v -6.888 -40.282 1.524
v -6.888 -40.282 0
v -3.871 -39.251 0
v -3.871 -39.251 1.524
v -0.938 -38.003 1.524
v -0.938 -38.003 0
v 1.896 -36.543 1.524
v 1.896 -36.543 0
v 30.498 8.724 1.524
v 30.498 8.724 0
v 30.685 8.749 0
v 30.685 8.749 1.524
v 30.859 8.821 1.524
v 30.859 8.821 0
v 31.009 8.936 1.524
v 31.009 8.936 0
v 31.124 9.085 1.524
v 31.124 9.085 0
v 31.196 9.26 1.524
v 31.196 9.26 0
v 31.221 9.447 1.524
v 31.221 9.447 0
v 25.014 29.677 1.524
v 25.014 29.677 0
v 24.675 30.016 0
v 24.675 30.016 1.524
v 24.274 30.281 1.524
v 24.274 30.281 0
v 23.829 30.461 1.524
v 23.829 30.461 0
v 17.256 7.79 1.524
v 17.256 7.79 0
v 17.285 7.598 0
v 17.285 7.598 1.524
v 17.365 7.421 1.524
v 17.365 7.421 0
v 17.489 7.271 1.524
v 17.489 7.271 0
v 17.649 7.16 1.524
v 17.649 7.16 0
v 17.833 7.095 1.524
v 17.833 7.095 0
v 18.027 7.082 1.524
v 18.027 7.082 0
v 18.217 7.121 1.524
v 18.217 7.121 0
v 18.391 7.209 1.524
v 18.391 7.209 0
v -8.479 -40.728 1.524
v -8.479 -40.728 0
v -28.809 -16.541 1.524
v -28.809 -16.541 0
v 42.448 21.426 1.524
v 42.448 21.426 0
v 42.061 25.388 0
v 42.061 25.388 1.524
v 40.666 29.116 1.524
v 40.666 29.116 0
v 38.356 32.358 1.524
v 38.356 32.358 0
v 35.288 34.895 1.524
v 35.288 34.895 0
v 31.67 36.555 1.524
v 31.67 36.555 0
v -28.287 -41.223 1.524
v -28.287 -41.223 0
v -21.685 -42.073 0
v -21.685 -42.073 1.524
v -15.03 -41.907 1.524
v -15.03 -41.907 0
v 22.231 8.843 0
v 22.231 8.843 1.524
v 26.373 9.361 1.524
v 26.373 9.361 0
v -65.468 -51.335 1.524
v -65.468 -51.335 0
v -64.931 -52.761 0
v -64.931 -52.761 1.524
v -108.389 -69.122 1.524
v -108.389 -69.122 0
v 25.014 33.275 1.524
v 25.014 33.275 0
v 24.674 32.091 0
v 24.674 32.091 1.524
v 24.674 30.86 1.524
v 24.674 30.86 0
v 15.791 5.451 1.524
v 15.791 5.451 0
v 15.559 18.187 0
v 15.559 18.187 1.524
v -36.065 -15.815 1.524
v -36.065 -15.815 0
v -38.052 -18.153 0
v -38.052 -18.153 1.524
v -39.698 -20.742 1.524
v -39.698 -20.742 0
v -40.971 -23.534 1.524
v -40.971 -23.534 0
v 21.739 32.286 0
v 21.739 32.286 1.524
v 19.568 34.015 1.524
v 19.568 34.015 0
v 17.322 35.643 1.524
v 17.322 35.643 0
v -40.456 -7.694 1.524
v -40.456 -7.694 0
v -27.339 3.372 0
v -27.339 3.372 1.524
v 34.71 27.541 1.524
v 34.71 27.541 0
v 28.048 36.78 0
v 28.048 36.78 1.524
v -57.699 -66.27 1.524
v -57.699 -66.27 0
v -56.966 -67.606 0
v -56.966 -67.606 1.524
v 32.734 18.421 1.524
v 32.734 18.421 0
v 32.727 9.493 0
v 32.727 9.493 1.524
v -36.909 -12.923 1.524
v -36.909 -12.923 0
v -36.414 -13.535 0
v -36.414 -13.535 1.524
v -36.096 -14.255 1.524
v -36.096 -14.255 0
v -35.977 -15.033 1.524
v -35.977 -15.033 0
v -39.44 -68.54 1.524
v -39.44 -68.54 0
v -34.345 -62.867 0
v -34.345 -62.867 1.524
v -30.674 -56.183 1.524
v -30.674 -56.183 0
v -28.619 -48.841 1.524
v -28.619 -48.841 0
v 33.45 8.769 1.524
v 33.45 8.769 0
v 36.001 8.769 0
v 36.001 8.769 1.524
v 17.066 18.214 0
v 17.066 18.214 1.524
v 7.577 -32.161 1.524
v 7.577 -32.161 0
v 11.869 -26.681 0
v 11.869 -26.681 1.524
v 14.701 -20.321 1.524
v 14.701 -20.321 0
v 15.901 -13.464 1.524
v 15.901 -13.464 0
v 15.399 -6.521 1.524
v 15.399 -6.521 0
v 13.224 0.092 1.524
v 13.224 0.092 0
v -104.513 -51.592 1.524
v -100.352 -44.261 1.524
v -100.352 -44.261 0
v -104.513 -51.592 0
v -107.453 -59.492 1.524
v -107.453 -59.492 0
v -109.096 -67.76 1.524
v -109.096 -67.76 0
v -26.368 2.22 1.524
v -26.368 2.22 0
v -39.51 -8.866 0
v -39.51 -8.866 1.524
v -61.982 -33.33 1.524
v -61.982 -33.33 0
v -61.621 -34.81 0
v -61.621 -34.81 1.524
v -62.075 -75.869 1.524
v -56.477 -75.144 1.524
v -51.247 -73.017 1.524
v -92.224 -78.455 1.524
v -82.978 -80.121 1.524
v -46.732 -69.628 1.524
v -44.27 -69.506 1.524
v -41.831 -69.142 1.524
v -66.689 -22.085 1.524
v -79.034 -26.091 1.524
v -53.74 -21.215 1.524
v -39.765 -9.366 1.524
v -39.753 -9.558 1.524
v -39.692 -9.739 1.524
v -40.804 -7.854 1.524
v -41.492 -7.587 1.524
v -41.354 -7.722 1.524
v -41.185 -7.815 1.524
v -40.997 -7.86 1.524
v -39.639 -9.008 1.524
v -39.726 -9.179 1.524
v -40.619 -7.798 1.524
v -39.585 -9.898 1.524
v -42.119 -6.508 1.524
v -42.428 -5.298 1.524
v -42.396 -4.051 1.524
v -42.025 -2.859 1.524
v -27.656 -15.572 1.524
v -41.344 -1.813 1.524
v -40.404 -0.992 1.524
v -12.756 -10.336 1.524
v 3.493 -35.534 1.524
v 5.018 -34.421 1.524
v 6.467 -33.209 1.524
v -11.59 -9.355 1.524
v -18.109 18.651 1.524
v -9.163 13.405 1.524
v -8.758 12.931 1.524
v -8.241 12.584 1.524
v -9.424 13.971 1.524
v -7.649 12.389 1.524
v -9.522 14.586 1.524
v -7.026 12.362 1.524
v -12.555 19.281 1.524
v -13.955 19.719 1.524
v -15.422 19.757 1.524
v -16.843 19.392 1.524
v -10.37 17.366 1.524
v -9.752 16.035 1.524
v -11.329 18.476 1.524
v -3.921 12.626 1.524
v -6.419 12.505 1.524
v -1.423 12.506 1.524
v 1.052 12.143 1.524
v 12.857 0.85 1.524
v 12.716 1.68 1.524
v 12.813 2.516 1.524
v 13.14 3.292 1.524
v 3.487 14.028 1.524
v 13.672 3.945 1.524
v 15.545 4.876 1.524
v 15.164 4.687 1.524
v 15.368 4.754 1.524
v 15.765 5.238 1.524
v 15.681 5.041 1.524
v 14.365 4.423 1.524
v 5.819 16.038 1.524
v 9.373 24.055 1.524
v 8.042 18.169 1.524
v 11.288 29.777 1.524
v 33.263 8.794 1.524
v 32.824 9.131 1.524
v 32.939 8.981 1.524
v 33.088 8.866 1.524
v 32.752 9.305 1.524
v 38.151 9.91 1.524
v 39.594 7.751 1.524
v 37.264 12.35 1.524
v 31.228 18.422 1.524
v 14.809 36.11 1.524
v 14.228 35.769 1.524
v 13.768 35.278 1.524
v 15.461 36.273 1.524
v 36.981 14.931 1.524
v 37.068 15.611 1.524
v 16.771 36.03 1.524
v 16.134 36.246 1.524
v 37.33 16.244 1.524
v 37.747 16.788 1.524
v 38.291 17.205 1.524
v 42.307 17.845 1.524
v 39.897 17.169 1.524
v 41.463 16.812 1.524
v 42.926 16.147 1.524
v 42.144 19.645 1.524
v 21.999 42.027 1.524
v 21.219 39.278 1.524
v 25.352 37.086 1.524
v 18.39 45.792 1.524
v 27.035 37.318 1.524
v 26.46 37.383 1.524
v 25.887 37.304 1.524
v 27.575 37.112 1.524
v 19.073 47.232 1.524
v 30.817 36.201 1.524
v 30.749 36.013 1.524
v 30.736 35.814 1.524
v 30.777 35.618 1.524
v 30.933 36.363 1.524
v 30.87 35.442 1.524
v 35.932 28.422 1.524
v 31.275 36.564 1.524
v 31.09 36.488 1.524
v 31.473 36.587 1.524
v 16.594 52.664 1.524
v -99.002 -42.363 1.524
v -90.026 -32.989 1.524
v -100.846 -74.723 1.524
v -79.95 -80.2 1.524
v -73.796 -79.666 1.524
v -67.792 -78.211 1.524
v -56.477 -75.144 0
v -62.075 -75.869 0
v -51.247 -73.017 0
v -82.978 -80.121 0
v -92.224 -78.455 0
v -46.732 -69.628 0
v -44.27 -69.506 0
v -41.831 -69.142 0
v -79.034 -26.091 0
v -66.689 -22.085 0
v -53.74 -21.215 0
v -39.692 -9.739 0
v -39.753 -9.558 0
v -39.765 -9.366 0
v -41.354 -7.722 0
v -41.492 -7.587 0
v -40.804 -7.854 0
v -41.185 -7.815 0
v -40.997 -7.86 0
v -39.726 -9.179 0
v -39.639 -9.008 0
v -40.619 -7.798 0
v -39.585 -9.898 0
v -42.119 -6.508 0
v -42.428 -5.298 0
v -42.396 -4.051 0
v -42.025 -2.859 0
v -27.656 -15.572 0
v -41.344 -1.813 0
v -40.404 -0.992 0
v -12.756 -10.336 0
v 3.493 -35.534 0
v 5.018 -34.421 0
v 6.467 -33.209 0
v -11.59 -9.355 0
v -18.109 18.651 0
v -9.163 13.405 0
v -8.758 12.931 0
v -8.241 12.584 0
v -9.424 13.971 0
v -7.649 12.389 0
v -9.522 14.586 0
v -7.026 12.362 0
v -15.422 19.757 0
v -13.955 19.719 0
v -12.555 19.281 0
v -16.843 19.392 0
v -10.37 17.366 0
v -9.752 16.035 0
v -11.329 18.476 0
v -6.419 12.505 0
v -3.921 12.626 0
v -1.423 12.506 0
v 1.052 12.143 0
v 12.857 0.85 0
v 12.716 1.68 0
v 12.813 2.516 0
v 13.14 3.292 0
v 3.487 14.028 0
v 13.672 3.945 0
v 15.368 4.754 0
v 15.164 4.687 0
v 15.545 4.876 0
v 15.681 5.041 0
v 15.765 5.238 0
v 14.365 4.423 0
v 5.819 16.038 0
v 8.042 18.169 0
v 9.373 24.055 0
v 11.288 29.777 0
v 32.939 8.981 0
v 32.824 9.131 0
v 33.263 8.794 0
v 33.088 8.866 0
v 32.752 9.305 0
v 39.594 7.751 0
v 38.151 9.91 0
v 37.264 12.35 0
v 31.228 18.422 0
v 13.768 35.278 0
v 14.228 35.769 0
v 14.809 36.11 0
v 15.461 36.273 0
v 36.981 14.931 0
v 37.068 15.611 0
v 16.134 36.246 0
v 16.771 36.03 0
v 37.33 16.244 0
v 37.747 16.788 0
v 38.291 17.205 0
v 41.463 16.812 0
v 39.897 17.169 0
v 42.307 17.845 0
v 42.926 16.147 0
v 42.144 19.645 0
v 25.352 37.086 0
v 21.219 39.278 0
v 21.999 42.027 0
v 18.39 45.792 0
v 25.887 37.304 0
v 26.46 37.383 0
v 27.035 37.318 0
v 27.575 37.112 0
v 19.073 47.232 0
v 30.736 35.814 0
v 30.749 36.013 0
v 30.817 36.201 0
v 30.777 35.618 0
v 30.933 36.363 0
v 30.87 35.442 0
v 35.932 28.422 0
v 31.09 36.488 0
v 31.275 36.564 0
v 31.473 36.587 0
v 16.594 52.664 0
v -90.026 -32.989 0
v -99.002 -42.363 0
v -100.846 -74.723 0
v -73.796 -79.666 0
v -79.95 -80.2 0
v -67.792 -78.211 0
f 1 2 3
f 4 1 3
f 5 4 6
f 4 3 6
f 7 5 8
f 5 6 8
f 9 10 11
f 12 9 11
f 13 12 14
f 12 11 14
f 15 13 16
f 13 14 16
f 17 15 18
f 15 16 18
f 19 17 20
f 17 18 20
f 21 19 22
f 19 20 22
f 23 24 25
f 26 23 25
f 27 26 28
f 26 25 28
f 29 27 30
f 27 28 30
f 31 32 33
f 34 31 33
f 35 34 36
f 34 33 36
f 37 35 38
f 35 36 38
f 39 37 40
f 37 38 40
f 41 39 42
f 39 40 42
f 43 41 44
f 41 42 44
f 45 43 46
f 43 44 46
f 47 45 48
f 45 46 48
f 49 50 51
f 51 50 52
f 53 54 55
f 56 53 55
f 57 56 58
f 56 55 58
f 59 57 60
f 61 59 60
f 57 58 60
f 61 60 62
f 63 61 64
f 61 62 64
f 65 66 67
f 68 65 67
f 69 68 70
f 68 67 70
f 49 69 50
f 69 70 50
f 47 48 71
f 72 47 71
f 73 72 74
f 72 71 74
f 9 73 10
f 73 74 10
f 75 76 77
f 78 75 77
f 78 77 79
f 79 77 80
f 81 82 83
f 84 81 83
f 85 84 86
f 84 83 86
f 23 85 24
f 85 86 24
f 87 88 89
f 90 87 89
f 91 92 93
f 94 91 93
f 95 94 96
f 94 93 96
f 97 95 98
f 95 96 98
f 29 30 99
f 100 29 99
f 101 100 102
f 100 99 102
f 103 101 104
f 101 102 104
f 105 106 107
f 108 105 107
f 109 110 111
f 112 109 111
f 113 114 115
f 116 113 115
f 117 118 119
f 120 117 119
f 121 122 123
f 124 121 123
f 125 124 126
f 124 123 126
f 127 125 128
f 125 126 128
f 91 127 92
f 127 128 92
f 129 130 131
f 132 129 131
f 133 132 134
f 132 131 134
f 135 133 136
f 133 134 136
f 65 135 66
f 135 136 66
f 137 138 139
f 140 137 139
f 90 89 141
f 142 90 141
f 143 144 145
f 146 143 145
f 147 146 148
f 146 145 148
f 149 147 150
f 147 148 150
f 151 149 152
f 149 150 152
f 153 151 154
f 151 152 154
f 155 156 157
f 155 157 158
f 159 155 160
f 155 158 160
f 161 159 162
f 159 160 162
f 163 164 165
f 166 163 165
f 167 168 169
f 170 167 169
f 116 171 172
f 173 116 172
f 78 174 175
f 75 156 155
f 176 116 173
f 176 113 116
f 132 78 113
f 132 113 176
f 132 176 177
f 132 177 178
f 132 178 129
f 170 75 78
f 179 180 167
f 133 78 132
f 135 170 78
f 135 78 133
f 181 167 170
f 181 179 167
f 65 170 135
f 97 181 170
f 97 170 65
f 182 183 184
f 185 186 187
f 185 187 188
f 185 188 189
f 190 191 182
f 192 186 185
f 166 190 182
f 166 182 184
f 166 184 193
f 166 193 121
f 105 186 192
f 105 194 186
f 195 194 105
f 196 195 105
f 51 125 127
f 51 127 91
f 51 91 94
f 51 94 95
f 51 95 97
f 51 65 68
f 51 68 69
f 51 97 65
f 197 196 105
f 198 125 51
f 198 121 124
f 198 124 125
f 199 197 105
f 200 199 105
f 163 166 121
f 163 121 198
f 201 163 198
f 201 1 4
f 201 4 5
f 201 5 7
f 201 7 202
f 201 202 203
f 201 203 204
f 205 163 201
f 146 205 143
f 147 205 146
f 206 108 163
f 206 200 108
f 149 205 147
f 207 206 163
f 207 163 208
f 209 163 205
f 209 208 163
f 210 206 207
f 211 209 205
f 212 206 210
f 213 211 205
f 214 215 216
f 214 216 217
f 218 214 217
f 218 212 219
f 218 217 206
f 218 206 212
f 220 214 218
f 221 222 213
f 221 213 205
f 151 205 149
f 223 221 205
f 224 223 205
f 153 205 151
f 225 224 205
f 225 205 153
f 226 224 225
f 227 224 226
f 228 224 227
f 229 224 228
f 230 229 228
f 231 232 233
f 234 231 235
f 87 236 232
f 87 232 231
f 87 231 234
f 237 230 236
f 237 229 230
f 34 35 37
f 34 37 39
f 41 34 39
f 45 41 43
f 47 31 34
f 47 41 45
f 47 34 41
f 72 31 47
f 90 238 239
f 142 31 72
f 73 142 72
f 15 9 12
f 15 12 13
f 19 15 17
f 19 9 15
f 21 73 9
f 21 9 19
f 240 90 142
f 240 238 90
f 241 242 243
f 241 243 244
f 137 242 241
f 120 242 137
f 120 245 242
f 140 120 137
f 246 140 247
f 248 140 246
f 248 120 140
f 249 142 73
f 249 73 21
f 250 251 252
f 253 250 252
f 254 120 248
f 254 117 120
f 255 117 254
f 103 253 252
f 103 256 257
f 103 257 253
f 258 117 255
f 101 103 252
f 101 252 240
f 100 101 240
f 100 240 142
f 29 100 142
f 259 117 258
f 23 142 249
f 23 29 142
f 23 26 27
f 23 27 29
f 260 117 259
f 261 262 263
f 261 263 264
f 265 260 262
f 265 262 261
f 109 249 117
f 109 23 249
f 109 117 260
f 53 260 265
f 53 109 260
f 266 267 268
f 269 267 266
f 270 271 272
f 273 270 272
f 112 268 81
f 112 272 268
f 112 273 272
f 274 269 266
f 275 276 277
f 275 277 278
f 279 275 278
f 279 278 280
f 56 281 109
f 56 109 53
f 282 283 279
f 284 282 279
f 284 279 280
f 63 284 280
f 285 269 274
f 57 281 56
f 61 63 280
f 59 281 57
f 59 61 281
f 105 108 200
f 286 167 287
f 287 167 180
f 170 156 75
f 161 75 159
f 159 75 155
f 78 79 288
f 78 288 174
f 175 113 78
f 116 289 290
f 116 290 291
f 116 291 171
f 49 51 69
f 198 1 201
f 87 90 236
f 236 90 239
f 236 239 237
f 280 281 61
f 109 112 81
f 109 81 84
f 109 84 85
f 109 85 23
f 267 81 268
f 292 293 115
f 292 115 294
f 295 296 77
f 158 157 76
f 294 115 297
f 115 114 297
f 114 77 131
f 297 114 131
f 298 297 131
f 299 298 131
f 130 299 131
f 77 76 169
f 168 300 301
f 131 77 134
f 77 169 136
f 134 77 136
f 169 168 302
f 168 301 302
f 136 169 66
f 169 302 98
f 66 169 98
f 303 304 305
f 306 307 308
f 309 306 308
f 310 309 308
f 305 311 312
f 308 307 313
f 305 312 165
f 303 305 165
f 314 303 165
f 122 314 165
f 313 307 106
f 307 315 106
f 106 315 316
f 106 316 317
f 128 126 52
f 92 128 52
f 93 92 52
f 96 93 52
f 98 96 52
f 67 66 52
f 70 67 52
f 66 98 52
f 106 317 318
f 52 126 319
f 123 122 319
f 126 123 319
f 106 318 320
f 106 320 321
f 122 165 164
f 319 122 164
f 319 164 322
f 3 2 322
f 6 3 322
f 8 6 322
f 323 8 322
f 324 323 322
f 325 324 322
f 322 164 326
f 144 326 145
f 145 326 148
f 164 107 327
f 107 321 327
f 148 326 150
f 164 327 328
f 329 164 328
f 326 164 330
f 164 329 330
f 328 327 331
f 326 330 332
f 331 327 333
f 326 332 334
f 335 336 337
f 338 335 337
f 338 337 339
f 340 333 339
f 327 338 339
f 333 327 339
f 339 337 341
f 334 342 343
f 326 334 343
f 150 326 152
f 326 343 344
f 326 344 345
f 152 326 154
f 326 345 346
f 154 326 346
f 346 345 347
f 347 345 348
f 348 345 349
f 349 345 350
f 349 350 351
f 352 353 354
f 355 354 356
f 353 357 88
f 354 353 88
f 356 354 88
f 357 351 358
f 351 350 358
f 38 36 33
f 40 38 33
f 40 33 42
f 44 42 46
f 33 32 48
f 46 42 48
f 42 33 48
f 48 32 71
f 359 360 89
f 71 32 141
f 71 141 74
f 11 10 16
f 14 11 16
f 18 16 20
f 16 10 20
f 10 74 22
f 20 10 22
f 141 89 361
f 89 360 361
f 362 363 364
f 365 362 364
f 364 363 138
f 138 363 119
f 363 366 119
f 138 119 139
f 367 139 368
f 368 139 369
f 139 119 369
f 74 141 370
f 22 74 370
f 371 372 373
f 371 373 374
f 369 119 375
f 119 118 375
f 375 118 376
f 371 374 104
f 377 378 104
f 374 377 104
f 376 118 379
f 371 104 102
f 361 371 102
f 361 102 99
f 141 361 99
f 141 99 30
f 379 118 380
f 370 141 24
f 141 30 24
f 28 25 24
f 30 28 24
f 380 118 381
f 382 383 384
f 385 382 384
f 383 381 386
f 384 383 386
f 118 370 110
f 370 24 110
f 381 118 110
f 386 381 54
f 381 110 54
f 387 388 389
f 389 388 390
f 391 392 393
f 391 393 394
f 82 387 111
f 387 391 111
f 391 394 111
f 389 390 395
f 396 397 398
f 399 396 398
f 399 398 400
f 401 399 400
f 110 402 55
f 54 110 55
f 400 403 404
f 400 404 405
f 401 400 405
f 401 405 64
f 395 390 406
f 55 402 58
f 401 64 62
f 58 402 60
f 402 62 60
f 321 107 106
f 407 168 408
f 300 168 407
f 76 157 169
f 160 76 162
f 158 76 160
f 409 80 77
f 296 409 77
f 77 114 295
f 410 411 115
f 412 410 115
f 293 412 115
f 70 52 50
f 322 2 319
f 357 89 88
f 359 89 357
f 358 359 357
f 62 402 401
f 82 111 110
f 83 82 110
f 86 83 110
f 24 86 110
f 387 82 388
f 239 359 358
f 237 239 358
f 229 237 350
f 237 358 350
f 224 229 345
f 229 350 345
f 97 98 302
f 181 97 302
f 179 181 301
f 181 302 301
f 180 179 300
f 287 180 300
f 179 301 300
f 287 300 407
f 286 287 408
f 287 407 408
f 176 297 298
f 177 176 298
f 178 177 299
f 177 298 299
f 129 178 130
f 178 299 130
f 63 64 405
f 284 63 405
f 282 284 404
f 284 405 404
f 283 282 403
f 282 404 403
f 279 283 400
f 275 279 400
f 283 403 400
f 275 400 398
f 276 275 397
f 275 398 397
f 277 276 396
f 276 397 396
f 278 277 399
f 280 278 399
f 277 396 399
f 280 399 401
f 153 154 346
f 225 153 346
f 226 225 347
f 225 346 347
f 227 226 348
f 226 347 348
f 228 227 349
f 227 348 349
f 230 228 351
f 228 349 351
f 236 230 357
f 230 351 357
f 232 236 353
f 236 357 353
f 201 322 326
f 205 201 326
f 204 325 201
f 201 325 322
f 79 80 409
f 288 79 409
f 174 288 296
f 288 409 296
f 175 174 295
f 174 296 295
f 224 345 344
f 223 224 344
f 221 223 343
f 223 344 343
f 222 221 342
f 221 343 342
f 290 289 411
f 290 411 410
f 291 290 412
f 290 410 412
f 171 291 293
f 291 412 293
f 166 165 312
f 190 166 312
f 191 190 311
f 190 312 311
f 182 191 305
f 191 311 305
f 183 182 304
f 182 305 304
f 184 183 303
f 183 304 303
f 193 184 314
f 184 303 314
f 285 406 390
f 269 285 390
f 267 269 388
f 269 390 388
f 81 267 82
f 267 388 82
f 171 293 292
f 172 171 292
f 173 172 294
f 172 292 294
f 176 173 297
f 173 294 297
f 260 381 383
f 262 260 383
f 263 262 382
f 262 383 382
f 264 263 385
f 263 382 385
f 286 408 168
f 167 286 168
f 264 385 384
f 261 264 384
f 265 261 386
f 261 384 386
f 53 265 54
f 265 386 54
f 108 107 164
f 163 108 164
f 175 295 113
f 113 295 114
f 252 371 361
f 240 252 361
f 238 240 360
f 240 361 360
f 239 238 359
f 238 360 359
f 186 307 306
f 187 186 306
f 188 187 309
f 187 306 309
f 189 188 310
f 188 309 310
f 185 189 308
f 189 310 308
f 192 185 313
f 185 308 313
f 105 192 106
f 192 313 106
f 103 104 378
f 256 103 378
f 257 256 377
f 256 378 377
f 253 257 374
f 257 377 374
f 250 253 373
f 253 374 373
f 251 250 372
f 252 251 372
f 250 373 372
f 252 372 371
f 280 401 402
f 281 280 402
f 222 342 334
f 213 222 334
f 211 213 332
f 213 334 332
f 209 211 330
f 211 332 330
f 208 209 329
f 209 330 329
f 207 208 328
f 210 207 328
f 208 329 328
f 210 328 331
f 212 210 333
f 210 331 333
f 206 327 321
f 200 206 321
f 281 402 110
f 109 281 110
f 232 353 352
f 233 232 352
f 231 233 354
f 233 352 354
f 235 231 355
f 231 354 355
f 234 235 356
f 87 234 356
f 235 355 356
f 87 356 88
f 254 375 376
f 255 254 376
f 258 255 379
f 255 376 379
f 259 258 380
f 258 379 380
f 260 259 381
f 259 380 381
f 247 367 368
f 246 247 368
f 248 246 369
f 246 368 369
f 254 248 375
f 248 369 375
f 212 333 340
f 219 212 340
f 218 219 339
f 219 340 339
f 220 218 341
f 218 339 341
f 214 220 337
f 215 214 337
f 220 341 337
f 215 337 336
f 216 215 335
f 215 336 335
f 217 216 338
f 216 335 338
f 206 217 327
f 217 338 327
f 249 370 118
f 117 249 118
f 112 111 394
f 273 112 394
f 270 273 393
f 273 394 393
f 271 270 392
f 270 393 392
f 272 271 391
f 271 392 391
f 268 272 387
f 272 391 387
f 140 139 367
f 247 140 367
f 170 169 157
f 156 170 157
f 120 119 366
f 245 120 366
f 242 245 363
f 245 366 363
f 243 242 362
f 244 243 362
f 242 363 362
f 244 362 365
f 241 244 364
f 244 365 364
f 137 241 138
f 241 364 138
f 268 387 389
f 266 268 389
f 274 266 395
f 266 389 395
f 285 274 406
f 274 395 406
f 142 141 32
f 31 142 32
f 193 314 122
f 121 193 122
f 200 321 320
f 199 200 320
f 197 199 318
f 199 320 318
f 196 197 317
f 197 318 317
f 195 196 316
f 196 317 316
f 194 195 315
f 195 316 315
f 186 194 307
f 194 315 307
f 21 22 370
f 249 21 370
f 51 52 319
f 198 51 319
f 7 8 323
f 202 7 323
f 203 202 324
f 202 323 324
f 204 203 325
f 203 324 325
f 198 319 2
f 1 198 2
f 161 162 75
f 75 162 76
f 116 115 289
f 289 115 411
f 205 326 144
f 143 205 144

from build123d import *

# Parameters (mm, degrees)
BOSS_EXTRUDE1_DEPTH = 1.524
CUT_EXTRUDE1_DEPTH  = 1.524
CUT_EXTRUDE2_DEPTH  = 1.524


with BuildPart() as part:
    # Sketch1 → Boss-Extrude1 (new body)
    with BuildSketch(Plane.XY):
        with BuildLine():
            Line((-18.109082737, 18.651136583), (-40.403888228, -0.992394741))
            ThreePointArc((-40.403888228, -0.992394741), (-42.395698567, -4.050724761), (-41.491876636, -7.586795582))
            ThreePointArc((-41.491876636, -7.586795582), (-40.996783491, -7.860427406), (-40.456184155, -7.693862236))
            Line((-40.456184155, -7.693862236), (-27.338891186, 3.372084587))
            Line((-27.338891186, 3.372084587), (-26.367560741, 2.220467499))
            Line((-26.367560741, 2.220467499), (-39.509764326, -8.866336125))
            ThreePointArc((-39.509764326, -8.866336125), (-39.764677025, -9.366363056), (-39.585096423, -9.898113208))
            Line((-39.585096423, -9.898113208), (-36.909039408, -12.923145527))
            ThreePointArc((-36.909039408, -12.923145527), (-36.096292723, -14.255273478), (-36.065454443, -15.815456497))
            ThreePointArc((-36.065454443, -15.815456497), (-38.919913552, -19.419117177), (-40.970693325, -23.533556316))
            ThreePointArc((-40.970693325, -23.533556316), (-85.68561882, -29.806279301), (-109.164446531, -68.374611713))
            ThreePointArc((-109.164446531, -68.374611713), (-86.824997617, -79.693885154), (-62.075353147, -75.868701805))
            ThreePointArc((-62.075353147, -75.868701805), (-53.793448225, -74.248732285), (-46.732322194, -69.627612338))
            ThreePointArc((-46.732322194, -69.627612338), (-43.045880581, -69.354101873), (-39.440165524, -68.539559875))
            ThreePointArc((-39.440165524, -68.539559875), (-30.674096062, -56.183483706), (-28.287271549, -41.22288008))
            ThreePointArc((-28.287271549, -41.22288008), (-18.354497785, -42.11718557), (-8.478792941, -40.727858108))
            Line((-8.478792941, -40.727858108), (-28.809143223, -16.540912603))
            Line((-28.809143223, -16.540912603), (-27.655597936, -15.571510358))
            Line((-27.655597936, -15.571510358), (-6.888329643, -40.281661868))
            ThreePointArc((-6.888329643, -40.281661868), (-2.393348388, -38.654039316), (1.896097193, -36.543430812))
            ThreePointArc((1.896097193, -36.543430812), (14.669066503, -20.423756748), (13.224183609, 0.092211431))
            ThreePointArc((13.224183609, 0.092211431), (12.94908113, 2.915517355), (15.164401866, 4.687265575))
            ThreePointArc((15.164401866, 4.687265575), (15.618518122, 4.953772723), (15.791401816, 5.451124573))
            Line((15.791401816, 5.451124573), (15.559206878, 18.186922579))
            Line((15.559206878, 18.186922579), (17.065612654, 18.214399421))
            Line((17.065612654, 18.214399421), (17.255673973, 7.790267081))
            ThreePointArc((17.255673973, 7.790267081), (17.649146232, 7.159803879), (18.390670497, 7.209261245))
            ThreePointArc((18.390670497, 7.209261245), (24.284101701, 9.245801019), (30.497638202, 8.724274642))
            ThreePointArc((30.497638202, 8.724274642), (31.008729101, 8.935857556), (31.220713438, 9.446782089))
            Line((31.220713438, 9.446782089), (31.227755152, 18.421680855))
            Line((31.227755152, 18.421680855), (32.734160928, 18.420716756))
            Line((32.734160928, 18.420716756), (32.727120315, 9.492749656))
            ThreePointArc((32.727120315, 9.492749656), (32.938701818, 8.981090412), (33.450193713, 8.769104665))
            Line((33.450193713, 8.769104665), (36.00103405, 8.76910061))
            Line((36.00103405, 8.76910061), (39.593571682, 7.750734608))
            ThreePointArc((39.593571682, 7.750734608), (37.634153074, 11.103388424), (36.980980252, 14.931308767))
            ThreePointArc((36.980980252, 14.931308767), (37.32973025, 16.244488278), (38.290753444, 17.204957649))
            ThreePointArc((38.290753444, 17.204957649), (40.689125585, 17.029816962), (42.926139447, 16.147415598))
            ThreePointArc((42.926139447, 16.147415598), (42.166781774, 18.73974704), (42.447864883, 21.426343152))
            ThreePointArc((42.447864883, 21.426343152), (39.616652478, 30.812755933), (31.670318465, 36.555254025))
            ThreePointArc((31.670318465, 36.555254025), (30.869545829, 36.286258041), (30.870312564, 35.441512478))
            Line((30.870312564, 35.441512478), (35.931597573, 28.422287011))
            Line((35.931597573, 28.422287011), (34.710083257, 27.541099888))
            Line((34.710083257, 27.541099888), (28.048154351, 36.779585234))
            ThreePointArc((28.048154351, 36.779585234), (26.749368414, 37.368488779), (25.351600254, 37.085829151))
            ThreePointArc((25.351600254, 37.085829151), (20.481432232, 44.59849919), (16.594043627, 52.663668593))
            ThreePointArc((16.594043627, 52.663668593), (19.678771518, 42.480420055), (25.014453648, 33.274737399))
            ThreePointArc((25.014453648, 33.274737399), (24.630642645, 31.475856238), (25.014447927, 29.676973856))
            ThreePointArc((25.014447927, 29.676973856), (24.481307432, 30.159012342), (23.8292382, 30.461345943))
            ThreePointArc((23.8292382, 30.461345943), (20.663534908, 33.163038536), (17.321589669, 35.643405891))
            ThreePointArc((17.321589669, 35.643405891), (15.461285039, 36.273044307), (13.767992132, 35.278088539))
            ThreePointArc((13.767992132, 35.278088539), (10.258583377, 26.939942946), (8.042121541, 18.169086735))
            ThreePointArc((8.042121541, 18.169086735), (4.666584105, 15.017884217), (1.052433145, 12.143472427))
            ThreePointArc((1.052433145, 12.143472427), (-2.67031295, 12.596290492), (-6.419385375, 12.504974353))
            ThreePointArc((-6.419385375, 12.504974353), (-8.511533948, 12.739347863), (-9.521951073, 14.586257126))
            ThreePointArc((-9.521951073, 14.586257126), (-12.55527012, 19.280991071), (-18.109082737, 18.651136583))
        make_face()
    extrude(amount=BOSS_EXTRUDE1_DEPTH)

    # Sketch2 → Cut-Extrude1 (cut)
    with BuildSketch(Plane(origin=(0, 0, 0), x_dir=(-1, 0, 0), z_dir=(0, 0, -1))):
        Polygon((-7.412304672, -34.333896752), (12.756455248, -10.335886692), (11.589770834, -9.355364649), (-8.578989086, -33.353374708), align=None)
    extrude(amount=-CUT_EXTRUDE1_DEPTH, mode=Mode.SUBTRACT)

    # Sketch3 → Cut-Extrude2 (cut)
    with BuildSketch(Plane(origin=(0, 0, 0), x_dir=(-1, 0, 0), z_dir=(0, 0, -1))):
        Polygon((92.239440666, -85.195390194), (57.69869779, -66.269905982), (56.966391259, -67.606432504), (91.507134135, -86.531916716), align=None)
        Polygon((113.568916303, -69.443616856), (65.468307652, -51.334573831), (64.931342073, -52.760843078), (113.031950724, -70.869886103), align=None)
        Polygon((103.892541474, -43.556614737), (61.98194232, -33.329554282), (61.620655619, -34.810110907), (103.531254772, -45.037171362), align=None)
    extrude(amount=-CUT_EXTRUDE2_DEPTH, mode=Mode.SUBTRACT)


solid = part.part
